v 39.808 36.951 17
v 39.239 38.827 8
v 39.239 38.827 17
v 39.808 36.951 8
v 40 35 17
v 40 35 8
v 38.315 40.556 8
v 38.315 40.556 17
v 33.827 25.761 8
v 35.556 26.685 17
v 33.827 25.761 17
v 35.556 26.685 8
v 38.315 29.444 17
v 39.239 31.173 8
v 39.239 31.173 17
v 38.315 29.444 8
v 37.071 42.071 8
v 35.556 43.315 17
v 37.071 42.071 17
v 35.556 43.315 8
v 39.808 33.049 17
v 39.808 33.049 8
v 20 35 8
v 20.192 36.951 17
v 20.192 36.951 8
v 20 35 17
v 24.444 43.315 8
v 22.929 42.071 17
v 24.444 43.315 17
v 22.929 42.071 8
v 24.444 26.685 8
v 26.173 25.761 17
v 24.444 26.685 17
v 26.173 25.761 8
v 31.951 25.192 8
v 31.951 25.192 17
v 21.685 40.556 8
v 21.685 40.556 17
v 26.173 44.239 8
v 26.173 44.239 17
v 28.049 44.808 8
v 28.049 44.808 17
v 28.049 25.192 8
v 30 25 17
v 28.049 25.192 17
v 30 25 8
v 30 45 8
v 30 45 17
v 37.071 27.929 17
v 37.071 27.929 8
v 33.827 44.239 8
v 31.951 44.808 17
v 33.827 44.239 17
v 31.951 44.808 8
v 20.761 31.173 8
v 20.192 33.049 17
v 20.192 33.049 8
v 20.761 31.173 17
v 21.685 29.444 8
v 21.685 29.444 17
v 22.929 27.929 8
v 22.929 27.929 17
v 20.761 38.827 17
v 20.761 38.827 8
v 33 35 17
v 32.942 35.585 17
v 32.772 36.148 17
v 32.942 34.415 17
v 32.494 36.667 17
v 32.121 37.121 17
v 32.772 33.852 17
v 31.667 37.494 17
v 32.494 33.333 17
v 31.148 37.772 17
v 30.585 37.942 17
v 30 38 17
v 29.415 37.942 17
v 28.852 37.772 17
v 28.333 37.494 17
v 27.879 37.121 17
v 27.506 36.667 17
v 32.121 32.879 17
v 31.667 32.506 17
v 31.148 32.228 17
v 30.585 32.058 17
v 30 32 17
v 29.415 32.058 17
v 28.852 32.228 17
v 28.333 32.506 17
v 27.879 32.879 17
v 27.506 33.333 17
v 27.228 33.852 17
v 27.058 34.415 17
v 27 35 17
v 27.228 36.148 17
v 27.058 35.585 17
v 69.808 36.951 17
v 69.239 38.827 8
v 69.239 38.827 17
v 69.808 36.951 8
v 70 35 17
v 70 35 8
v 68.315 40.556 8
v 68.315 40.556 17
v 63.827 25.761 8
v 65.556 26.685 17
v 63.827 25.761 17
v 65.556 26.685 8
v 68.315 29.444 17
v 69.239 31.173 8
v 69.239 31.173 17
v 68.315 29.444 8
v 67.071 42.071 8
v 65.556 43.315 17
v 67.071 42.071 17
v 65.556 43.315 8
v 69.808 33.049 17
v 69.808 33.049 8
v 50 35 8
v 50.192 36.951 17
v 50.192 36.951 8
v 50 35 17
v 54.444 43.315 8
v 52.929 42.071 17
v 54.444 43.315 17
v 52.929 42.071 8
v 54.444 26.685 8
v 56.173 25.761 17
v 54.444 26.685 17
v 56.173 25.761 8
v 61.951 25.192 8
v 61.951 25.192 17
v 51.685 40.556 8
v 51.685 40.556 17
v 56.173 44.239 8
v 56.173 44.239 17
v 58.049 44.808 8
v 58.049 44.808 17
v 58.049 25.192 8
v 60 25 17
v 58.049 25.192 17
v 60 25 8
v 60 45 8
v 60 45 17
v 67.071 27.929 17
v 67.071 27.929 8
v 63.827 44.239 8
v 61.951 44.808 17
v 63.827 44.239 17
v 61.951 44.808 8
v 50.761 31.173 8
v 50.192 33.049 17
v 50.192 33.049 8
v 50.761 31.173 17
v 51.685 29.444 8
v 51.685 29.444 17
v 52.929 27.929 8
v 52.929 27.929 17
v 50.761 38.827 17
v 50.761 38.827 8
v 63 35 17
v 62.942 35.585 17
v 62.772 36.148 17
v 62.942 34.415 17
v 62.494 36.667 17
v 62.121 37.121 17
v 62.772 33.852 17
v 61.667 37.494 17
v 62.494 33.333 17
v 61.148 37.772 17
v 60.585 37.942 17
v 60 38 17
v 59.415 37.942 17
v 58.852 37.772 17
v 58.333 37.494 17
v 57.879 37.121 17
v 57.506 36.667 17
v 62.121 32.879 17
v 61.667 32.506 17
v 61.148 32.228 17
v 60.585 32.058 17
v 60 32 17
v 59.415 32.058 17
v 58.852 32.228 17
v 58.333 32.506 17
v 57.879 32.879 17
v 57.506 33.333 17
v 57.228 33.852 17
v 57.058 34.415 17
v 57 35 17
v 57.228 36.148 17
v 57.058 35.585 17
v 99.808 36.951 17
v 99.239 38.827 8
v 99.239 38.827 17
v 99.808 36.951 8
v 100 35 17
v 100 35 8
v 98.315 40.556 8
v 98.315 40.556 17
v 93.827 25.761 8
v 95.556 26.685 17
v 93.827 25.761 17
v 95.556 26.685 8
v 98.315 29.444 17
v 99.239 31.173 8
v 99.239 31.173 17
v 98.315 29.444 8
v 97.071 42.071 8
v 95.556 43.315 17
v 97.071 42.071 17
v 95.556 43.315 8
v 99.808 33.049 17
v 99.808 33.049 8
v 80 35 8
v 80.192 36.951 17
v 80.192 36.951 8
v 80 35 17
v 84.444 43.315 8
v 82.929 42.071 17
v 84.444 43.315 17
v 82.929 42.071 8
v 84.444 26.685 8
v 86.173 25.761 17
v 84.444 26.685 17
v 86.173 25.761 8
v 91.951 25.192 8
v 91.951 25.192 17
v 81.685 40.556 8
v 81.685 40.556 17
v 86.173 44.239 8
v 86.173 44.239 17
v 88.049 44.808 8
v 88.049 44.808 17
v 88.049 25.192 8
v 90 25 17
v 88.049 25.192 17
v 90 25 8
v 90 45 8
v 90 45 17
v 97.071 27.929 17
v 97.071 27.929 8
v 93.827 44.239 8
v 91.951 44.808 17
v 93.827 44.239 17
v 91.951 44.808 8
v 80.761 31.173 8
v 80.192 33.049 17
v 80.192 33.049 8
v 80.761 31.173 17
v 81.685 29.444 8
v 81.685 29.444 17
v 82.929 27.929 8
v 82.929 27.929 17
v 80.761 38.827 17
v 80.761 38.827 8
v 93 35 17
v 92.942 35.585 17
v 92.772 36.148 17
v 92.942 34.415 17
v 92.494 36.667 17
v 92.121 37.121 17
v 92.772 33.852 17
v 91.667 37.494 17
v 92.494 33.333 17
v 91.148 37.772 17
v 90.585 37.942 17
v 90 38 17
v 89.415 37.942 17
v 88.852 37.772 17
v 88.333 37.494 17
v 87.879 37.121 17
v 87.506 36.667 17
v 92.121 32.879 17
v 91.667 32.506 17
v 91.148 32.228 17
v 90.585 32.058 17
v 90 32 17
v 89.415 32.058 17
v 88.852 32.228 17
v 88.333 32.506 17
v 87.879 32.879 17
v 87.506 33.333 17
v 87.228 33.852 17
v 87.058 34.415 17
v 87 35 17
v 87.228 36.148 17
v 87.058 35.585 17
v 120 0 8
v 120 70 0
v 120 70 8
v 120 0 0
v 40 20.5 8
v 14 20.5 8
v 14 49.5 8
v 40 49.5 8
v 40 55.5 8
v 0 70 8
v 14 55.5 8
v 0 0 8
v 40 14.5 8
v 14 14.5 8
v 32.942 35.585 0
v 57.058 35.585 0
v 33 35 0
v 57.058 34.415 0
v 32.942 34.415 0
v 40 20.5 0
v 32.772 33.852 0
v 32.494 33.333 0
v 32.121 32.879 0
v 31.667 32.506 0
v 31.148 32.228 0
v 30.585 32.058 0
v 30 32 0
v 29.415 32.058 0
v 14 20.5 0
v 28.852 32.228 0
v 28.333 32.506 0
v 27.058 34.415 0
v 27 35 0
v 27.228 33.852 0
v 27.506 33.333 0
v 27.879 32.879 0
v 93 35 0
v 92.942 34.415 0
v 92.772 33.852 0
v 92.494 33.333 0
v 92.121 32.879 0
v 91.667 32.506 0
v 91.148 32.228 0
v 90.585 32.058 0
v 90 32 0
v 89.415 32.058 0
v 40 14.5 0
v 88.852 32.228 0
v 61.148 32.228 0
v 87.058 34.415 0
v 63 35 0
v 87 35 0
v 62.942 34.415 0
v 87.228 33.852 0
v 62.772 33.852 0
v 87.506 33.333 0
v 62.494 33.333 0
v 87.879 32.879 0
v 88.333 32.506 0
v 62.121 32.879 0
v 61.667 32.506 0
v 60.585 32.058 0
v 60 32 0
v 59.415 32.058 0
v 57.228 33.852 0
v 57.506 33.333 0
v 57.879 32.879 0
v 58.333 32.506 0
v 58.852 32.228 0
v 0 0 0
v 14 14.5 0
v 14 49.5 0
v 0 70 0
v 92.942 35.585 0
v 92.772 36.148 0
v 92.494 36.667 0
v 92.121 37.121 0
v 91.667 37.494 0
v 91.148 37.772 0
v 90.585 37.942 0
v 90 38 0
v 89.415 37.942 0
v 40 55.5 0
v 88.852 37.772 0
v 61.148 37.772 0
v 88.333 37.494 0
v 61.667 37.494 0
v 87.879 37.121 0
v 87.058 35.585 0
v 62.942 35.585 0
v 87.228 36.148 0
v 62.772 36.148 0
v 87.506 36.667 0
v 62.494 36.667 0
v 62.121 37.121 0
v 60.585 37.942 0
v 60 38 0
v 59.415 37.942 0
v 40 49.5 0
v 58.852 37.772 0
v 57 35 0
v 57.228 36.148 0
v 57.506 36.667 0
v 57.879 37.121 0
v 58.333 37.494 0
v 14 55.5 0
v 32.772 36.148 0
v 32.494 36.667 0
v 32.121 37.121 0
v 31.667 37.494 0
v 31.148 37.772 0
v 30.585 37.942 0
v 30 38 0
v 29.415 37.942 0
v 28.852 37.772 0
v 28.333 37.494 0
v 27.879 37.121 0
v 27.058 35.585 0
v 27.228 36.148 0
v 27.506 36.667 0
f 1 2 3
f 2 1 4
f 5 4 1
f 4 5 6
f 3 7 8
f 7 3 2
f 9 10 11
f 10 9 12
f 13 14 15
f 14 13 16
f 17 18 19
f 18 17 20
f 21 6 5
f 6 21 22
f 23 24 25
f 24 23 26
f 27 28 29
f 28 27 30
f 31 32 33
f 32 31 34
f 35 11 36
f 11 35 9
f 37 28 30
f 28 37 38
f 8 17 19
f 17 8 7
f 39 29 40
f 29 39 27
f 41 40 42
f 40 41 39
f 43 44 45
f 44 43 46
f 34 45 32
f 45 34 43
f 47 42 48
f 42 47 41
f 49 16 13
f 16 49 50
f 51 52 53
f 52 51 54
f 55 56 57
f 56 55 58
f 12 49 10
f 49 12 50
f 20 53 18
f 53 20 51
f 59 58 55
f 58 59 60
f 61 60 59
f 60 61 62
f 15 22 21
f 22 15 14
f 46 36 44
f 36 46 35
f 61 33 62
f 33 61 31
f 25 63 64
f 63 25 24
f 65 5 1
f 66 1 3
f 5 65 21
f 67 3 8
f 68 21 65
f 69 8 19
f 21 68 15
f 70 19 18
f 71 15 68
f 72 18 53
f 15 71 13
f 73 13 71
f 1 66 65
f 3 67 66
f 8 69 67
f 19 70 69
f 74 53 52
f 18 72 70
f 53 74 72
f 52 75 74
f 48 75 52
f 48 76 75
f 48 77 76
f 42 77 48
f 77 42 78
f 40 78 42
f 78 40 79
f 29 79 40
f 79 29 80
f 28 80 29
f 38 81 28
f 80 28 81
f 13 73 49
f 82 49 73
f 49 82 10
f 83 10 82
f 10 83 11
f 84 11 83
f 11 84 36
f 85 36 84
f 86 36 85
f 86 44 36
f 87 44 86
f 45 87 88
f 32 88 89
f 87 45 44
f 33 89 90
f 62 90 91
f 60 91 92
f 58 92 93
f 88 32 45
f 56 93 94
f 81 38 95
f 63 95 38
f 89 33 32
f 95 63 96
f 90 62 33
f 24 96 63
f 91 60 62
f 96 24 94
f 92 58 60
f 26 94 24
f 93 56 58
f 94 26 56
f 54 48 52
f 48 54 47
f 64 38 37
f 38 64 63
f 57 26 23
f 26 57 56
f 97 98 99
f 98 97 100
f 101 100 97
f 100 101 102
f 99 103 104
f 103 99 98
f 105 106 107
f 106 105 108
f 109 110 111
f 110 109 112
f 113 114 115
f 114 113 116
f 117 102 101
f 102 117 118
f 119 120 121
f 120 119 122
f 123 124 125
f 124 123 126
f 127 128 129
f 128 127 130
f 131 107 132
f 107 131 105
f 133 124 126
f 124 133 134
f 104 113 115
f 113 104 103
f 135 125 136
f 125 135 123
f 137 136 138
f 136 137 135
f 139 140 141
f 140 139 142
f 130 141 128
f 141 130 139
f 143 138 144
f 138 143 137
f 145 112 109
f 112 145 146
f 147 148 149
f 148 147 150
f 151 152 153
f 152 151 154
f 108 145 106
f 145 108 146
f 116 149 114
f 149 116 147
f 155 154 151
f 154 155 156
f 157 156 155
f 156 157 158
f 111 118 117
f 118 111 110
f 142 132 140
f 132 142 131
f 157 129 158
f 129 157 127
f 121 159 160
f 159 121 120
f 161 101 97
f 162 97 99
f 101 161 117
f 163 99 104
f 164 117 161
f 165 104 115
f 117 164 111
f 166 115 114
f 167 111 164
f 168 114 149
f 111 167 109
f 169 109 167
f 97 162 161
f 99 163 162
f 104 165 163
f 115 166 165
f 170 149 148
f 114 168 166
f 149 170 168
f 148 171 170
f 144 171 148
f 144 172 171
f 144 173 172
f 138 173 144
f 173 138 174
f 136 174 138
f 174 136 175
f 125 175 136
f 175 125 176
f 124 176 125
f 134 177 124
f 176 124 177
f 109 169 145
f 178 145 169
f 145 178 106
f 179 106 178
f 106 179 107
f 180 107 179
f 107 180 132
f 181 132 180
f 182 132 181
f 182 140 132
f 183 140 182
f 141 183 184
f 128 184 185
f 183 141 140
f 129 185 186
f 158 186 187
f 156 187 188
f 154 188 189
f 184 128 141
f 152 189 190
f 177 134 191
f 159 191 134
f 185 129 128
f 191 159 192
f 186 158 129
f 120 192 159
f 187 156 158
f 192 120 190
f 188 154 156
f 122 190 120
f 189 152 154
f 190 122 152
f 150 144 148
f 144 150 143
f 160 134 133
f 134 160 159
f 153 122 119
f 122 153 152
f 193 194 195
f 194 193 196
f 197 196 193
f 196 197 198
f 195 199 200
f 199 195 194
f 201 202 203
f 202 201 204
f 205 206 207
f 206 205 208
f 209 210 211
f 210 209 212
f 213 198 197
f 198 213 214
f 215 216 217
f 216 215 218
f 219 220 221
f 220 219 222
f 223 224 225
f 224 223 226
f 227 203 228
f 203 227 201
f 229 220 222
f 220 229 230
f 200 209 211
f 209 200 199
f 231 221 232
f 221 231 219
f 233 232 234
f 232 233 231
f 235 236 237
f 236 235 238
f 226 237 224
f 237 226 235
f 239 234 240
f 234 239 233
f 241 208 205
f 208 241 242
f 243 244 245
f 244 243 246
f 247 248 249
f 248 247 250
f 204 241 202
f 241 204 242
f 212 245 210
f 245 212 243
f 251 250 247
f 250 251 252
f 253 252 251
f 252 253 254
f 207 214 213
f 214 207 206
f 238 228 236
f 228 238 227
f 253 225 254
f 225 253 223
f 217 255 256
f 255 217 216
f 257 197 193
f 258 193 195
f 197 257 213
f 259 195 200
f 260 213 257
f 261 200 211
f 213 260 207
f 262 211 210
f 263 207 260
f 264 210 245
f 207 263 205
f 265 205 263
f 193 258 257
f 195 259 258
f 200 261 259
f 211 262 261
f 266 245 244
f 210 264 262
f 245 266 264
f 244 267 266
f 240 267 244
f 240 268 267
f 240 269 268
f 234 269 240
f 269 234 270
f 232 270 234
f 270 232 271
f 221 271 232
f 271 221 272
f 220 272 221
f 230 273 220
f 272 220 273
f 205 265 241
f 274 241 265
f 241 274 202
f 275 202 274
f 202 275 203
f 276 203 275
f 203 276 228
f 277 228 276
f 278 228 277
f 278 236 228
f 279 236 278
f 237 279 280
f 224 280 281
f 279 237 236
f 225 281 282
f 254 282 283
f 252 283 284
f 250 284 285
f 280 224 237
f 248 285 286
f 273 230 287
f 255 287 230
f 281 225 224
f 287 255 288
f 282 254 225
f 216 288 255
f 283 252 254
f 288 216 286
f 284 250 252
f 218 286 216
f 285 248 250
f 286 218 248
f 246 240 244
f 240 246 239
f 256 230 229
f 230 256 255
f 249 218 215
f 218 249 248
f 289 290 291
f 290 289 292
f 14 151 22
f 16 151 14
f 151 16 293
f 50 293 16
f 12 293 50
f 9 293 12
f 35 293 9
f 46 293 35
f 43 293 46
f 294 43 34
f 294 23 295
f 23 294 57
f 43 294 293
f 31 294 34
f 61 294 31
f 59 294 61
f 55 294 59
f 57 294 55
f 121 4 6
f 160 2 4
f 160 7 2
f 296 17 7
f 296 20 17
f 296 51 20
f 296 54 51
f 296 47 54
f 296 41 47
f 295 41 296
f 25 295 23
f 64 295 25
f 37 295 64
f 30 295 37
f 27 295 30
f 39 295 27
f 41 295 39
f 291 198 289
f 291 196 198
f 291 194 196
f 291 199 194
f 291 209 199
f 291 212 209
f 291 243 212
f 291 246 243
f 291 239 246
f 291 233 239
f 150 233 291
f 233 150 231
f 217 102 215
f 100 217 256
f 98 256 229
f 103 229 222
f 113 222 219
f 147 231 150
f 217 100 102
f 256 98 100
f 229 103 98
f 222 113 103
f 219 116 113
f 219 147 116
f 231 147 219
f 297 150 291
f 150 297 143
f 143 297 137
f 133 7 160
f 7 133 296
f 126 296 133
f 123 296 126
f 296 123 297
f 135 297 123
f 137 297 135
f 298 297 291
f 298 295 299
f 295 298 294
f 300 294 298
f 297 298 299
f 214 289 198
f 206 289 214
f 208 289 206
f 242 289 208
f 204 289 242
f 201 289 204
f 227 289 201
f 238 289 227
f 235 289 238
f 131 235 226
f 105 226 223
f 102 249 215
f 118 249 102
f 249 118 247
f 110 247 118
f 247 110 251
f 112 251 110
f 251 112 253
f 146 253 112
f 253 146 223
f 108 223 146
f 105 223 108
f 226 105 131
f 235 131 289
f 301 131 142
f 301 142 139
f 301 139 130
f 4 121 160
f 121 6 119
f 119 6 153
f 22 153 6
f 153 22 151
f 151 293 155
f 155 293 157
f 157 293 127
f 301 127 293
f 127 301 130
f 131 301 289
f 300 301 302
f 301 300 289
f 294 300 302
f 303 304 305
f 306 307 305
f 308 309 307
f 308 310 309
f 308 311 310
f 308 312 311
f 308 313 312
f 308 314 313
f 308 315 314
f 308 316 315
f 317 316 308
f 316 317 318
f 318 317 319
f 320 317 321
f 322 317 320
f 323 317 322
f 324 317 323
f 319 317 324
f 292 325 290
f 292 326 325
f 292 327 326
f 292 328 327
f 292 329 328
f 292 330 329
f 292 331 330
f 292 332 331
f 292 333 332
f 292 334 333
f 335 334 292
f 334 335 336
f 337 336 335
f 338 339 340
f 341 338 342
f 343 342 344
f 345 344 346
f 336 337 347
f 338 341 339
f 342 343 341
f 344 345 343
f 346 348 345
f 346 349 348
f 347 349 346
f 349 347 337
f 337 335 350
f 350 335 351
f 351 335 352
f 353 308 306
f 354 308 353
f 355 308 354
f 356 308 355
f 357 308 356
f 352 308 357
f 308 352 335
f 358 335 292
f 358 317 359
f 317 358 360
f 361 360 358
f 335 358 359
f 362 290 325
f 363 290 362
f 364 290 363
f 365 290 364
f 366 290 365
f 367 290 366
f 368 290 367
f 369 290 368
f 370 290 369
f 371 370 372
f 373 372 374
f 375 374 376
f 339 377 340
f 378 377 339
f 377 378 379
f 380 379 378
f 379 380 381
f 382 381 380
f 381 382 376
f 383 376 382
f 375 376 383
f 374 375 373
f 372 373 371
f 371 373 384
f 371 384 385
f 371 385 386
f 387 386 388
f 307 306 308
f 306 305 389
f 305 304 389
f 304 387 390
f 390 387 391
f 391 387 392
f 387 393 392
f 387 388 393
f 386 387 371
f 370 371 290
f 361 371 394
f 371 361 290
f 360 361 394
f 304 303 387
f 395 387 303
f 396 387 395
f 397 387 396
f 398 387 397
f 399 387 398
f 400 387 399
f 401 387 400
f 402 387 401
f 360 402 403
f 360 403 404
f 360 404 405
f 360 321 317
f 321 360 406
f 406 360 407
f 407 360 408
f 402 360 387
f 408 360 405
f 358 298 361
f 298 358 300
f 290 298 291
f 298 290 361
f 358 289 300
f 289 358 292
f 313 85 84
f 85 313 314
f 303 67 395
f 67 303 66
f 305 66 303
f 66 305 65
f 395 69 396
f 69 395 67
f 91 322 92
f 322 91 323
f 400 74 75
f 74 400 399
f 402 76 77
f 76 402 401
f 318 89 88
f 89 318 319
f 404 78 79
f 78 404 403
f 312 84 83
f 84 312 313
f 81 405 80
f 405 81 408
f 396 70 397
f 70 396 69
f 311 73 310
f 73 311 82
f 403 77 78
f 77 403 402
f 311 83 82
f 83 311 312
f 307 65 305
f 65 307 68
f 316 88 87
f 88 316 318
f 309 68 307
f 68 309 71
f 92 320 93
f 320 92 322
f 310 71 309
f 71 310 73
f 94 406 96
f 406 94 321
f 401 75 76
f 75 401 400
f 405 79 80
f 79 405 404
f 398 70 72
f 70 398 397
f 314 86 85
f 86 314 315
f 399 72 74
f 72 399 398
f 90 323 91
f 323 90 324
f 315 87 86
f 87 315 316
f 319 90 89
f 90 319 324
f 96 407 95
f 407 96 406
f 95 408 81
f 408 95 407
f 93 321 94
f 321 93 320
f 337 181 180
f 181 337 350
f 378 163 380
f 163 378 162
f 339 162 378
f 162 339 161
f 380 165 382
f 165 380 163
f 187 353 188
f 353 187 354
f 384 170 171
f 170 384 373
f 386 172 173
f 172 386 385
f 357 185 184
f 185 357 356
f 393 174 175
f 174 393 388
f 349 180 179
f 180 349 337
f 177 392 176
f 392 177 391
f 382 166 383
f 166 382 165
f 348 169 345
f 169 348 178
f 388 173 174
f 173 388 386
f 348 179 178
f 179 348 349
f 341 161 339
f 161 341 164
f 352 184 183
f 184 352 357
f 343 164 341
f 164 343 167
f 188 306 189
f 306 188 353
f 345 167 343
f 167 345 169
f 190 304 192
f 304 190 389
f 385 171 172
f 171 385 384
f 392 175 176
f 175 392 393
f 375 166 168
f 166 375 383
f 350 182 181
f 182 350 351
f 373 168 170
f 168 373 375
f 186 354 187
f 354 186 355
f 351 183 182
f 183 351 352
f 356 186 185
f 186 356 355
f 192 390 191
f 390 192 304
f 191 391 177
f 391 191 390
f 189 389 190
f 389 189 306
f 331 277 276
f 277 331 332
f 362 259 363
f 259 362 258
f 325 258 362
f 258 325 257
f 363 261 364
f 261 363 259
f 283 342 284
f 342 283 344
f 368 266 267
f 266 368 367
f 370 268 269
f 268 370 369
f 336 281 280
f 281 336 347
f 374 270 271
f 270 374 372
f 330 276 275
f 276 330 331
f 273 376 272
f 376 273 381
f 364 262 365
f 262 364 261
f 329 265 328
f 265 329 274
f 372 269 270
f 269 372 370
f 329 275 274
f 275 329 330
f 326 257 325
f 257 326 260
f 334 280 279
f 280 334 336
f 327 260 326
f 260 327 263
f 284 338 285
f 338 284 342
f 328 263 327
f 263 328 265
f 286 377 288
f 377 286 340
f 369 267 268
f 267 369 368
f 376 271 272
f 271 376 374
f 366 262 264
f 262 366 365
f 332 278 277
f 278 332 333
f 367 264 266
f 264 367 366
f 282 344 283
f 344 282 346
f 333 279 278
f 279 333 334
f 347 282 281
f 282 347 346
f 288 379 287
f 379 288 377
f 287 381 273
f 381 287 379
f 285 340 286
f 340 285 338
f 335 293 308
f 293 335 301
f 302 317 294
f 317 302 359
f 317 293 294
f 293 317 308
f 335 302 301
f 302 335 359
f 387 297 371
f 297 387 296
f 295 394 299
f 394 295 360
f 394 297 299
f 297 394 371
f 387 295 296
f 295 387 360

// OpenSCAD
$fn = 32;

// ----------------------------------------------------------------------
// Drill jig: three_boss_slot jig
// ----------------------------------------------------------------------

// --- parameters (mm) ---
plate_l = 120;            // plate length, X
plate_w = 70;             // plate width, Y
plate_t = 8;              // plate thickness
boss_d = 20;              // guide boss diameter
boss_h = 10;              // boss height above the plate
guide_d = 6;              // guide hole diameter
boss_pitch = 30;          // boss pitch
slot_w = 6;               // clamp slot width
slot_l = 26;              // clamp slot length
slot_x = 14;              // slot start X

n_boss = 3;  // guide bosses
boss_x0 = (plate_l - (n_boss - 1) * boss_pitch) / 2;  // first boss X
boss_top = plate_t - 1 + boss_h;  // boss crown height
total_h = boss_top;  // overall height

difference() {
  union() {
  cube([plate_l, plate_w, plate_t]);
  for (i = [0 : n_boss - 1])
    translate([boss_x0 + i * boss_pitch, plate_w / 2, plate_t - 1])
      cylinder(h = boss_h, d = boss_d);
  }
  for (i = [0 : n_boss - 1])
    translate([boss_x0 + i * boss_pitch, plate_w / 2, -1])
      cylinder(h = plate_t + boss_h, d = guide_d);
  for (cy = [plate_w * 0.25, plate_w * 0.75])
    translate([slot_x, cy - slot_w / 2, -1])
      cube([slot_l, slot_w, plate_t + 2]);
}
